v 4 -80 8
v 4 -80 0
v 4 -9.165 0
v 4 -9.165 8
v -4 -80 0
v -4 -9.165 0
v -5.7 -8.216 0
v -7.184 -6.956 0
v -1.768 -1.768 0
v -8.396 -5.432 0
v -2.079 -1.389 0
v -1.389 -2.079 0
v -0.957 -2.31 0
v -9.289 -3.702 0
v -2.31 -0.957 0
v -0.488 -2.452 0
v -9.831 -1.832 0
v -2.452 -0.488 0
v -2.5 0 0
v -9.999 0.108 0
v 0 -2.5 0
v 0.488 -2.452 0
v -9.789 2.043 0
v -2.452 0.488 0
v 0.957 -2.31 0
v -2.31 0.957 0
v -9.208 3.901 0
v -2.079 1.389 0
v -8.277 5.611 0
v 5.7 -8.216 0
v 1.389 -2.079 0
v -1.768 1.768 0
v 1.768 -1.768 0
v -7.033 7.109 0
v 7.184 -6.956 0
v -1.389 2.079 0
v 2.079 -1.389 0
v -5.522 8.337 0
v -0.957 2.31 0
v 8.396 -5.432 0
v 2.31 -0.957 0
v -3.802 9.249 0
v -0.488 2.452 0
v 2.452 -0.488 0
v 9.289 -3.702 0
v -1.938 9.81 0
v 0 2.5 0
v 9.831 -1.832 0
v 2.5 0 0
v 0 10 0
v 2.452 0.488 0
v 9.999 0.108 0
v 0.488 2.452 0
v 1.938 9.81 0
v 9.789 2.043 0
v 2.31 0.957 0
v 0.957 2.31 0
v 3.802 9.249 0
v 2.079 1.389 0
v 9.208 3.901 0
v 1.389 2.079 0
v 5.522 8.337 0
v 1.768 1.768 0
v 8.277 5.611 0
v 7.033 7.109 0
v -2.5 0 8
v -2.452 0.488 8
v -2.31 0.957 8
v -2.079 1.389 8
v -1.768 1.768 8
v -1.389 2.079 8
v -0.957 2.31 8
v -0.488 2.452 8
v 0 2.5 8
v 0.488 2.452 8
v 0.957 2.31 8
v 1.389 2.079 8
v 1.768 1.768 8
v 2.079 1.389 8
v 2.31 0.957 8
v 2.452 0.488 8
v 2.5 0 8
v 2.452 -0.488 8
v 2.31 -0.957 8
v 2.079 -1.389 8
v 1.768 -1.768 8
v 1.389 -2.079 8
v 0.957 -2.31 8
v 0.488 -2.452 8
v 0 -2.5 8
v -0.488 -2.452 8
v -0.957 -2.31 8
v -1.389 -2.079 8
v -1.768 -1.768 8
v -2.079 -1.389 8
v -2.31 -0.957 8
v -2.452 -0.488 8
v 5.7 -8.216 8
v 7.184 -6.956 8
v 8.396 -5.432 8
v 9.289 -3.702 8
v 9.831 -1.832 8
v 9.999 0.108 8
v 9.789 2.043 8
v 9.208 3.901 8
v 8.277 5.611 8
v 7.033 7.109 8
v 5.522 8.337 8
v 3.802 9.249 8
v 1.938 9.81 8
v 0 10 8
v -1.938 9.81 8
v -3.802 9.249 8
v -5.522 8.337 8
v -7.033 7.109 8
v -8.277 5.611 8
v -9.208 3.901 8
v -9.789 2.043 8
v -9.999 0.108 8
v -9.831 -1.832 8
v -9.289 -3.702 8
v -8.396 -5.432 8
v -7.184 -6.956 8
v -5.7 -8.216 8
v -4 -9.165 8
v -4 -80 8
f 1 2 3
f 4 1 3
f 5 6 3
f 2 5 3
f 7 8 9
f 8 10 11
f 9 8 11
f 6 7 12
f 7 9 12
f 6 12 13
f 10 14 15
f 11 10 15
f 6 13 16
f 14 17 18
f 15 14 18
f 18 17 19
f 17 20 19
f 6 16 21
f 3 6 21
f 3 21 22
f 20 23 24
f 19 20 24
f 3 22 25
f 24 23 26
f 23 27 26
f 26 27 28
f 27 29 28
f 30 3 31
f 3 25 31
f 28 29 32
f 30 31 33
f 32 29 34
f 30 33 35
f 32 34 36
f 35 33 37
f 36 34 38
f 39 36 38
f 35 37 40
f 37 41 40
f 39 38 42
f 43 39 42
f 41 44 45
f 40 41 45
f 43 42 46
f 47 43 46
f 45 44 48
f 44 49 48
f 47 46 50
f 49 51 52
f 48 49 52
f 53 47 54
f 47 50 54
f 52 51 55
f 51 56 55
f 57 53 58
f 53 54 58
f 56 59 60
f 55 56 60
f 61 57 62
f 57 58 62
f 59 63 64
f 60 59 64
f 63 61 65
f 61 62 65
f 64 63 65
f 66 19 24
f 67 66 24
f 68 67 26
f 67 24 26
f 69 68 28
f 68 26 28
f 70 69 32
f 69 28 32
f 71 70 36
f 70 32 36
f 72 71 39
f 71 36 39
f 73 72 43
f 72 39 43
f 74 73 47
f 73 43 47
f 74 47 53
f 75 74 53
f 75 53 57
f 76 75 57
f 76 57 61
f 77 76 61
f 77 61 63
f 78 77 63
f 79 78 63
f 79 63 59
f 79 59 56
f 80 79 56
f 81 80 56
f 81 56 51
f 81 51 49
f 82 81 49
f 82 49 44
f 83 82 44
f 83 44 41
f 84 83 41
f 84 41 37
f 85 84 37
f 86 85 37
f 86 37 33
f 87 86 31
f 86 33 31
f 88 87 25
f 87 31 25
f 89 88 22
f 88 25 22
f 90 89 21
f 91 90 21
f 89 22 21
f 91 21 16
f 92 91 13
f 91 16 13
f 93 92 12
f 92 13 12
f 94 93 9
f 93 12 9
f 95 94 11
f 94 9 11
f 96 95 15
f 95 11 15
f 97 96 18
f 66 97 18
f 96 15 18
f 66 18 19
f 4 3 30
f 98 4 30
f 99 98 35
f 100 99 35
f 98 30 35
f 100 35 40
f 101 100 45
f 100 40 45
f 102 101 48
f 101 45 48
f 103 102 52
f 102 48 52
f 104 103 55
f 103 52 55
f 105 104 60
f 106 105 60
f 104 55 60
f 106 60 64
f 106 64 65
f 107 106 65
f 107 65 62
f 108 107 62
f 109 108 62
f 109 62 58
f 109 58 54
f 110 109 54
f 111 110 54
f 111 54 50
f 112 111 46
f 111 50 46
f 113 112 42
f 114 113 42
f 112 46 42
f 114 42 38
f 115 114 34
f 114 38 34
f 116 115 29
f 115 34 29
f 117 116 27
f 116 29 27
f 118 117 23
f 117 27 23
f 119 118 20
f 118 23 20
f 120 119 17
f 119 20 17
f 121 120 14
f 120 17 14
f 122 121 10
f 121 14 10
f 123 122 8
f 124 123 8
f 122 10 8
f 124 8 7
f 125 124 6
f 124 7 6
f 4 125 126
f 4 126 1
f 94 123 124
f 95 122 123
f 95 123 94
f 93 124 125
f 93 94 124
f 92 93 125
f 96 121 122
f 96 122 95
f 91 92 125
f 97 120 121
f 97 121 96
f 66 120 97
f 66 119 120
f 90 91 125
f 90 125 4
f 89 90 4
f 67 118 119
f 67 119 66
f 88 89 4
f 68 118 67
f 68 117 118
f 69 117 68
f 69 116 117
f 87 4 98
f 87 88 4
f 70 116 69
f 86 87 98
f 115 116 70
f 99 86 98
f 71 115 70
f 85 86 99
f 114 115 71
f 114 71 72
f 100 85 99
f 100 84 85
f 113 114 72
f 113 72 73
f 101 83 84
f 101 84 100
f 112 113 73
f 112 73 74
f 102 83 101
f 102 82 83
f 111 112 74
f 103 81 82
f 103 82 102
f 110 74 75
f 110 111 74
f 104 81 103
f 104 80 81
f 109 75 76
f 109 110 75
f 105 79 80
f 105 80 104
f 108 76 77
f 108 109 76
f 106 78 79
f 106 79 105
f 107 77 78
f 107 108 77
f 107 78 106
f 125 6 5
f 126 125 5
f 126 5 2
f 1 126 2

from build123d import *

# Parameters (mm, degrees)
EXTRUDE_2_DEPTH    = 8
HOLE_WIZARD_M6_1_D = 5


with BuildPart() as part:
    # 草图1 → 凸台-拉伸2 (new body)
    with BuildSketch(Plane.XY):
        with BuildLine():
            Line((-4, -9.16515139), (-4, -80))
            Line((-4, -80), (4, -80))
            Line((4, -80), (4, -9.16515139))
            ThreePointArc((4, -9.16515139), (0, 10), (-4, -9.16515139))
        make_face()
    extrude(amount=EXTRUDE_2_DEPTH)

    # M6 螺纹孔1 (through all)
    with Locations(Plane.XY.offset(8)):
        with Locations((0, 0)):
            Hole(HOLE_WIZARD_M6_1_D / 2)


solid = part.part
